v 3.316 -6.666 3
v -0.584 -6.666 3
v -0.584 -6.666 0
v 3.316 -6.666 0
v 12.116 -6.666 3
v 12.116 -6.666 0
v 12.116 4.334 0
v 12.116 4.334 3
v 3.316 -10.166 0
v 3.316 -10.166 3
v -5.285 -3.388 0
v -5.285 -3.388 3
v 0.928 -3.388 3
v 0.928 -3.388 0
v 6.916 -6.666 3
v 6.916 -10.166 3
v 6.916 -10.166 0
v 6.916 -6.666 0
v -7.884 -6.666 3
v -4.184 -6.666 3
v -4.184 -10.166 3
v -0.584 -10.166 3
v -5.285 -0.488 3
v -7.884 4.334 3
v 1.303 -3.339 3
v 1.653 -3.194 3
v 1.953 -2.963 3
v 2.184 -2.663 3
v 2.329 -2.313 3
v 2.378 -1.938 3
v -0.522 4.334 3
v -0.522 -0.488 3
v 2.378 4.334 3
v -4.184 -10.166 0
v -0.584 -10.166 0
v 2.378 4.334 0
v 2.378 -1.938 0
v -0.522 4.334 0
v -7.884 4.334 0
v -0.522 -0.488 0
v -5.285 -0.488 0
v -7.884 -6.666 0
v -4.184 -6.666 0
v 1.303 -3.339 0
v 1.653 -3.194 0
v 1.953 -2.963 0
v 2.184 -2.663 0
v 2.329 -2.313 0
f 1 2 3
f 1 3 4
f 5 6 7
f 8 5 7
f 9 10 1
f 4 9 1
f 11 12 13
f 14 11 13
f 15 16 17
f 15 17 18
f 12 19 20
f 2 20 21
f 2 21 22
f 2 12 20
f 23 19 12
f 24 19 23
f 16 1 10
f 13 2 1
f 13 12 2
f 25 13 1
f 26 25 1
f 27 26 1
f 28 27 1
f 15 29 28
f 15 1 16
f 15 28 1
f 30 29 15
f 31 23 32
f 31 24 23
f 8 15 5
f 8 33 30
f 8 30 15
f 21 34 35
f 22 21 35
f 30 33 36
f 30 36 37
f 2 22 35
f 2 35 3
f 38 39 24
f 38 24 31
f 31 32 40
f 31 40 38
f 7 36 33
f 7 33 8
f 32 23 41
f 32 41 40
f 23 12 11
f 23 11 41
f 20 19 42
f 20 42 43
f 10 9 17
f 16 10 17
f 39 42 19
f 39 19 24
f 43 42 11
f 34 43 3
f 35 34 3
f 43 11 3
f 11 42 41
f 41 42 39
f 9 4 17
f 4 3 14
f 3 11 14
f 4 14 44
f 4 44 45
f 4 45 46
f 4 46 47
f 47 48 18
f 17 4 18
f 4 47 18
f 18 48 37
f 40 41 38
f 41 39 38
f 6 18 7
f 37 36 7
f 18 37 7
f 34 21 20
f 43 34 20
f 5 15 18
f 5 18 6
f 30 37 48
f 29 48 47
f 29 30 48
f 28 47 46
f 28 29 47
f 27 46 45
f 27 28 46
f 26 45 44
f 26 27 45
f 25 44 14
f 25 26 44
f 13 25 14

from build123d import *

# Parameters (mm, degrees)
SKETCH1_W           = 20
SKETCH1_H           = 14.5
BOSS_EXTRUDE1_DEPTH = 3
SKETCH2_W           = 3.7
SKETCH2_H           = 3.5
SKETCH2_W_2         = 3.9
SKETCH2_W_3         = 5.2
CUT_EXTRUDE1_DEPTH  = 3
CUT_EXTRUDE2_DEPTH  = 3
SKETCH4_W           = 6.213336345
SKETCH4_H           = 2.9
CUT_EXTRUDE3_DEPTH  = 10


with BuildPart() as part:
    # Sketch1 → Boss-Extrude1 (new body)
    with BuildSketch(Plane.XY):
        with Locations((2.116182573, -2.915975104)):
            Rectangle(SKETCH1_W, SKETCH1_H)
    extrude(amount=BOSS_EXTRUDE1_DEPTH)

    # Sketch2 → Cut-Extrude1 (cut)
    with BuildSketch(Plane.XY.offset(3)):
        with Locations((-6.033817427, -8.415975104)):
            Rectangle(SKETCH2_W, SKETCH2_H)
        with Locations((1.366182573, -8.415975104)):
            Rectangle(SKETCH2_W_2, SKETCH2_H)
        with Locations((9.516182573, -8.415975104)):
            Rectangle(SKETCH2_W_3, SKETCH2_H)
    extrude(amount=-CUT_EXTRUDE1_DEPTH, mode=Mode.SUBTRACT)

    # Sketch3 → Cut-Extrude2 (cut)
    with BuildSketch(Plane.XY.offset(3)):
        with BuildLine():
            Line((2.377974825, 4.334024896), (2.377974825, -1.938179145))
            ThreePointArc((2.377974825, -1.938179145), (0.927974825, -3.388179145), (-0.522025175, -1.938179145))
            Line((-0.522025175, -1.938179145), (-0.522025175, 4.334024896))
            ThreePointArc((-0.522025175, 4.334024896), (0.927974825, 5.784024896), (2.377974825, 4.334024896))
        make_face()
    extrude(amount=-CUT_EXTRUDE2_DEPTH, mode=Mode.SUBTRACT)

    # Sketch4 → Cut-Extrude3 (cut)
    with BuildSketch(Plane.XY.offset(3)):
        with Locations((-2.178693348, -1.938179145)):
            Rectangle(SKETCH4_W, SKETCH4_H)
    extrude(amount=-CUT_EXTRUDE3_DEPTH, mode=Mode.SUBTRACT)


solid = part.part
